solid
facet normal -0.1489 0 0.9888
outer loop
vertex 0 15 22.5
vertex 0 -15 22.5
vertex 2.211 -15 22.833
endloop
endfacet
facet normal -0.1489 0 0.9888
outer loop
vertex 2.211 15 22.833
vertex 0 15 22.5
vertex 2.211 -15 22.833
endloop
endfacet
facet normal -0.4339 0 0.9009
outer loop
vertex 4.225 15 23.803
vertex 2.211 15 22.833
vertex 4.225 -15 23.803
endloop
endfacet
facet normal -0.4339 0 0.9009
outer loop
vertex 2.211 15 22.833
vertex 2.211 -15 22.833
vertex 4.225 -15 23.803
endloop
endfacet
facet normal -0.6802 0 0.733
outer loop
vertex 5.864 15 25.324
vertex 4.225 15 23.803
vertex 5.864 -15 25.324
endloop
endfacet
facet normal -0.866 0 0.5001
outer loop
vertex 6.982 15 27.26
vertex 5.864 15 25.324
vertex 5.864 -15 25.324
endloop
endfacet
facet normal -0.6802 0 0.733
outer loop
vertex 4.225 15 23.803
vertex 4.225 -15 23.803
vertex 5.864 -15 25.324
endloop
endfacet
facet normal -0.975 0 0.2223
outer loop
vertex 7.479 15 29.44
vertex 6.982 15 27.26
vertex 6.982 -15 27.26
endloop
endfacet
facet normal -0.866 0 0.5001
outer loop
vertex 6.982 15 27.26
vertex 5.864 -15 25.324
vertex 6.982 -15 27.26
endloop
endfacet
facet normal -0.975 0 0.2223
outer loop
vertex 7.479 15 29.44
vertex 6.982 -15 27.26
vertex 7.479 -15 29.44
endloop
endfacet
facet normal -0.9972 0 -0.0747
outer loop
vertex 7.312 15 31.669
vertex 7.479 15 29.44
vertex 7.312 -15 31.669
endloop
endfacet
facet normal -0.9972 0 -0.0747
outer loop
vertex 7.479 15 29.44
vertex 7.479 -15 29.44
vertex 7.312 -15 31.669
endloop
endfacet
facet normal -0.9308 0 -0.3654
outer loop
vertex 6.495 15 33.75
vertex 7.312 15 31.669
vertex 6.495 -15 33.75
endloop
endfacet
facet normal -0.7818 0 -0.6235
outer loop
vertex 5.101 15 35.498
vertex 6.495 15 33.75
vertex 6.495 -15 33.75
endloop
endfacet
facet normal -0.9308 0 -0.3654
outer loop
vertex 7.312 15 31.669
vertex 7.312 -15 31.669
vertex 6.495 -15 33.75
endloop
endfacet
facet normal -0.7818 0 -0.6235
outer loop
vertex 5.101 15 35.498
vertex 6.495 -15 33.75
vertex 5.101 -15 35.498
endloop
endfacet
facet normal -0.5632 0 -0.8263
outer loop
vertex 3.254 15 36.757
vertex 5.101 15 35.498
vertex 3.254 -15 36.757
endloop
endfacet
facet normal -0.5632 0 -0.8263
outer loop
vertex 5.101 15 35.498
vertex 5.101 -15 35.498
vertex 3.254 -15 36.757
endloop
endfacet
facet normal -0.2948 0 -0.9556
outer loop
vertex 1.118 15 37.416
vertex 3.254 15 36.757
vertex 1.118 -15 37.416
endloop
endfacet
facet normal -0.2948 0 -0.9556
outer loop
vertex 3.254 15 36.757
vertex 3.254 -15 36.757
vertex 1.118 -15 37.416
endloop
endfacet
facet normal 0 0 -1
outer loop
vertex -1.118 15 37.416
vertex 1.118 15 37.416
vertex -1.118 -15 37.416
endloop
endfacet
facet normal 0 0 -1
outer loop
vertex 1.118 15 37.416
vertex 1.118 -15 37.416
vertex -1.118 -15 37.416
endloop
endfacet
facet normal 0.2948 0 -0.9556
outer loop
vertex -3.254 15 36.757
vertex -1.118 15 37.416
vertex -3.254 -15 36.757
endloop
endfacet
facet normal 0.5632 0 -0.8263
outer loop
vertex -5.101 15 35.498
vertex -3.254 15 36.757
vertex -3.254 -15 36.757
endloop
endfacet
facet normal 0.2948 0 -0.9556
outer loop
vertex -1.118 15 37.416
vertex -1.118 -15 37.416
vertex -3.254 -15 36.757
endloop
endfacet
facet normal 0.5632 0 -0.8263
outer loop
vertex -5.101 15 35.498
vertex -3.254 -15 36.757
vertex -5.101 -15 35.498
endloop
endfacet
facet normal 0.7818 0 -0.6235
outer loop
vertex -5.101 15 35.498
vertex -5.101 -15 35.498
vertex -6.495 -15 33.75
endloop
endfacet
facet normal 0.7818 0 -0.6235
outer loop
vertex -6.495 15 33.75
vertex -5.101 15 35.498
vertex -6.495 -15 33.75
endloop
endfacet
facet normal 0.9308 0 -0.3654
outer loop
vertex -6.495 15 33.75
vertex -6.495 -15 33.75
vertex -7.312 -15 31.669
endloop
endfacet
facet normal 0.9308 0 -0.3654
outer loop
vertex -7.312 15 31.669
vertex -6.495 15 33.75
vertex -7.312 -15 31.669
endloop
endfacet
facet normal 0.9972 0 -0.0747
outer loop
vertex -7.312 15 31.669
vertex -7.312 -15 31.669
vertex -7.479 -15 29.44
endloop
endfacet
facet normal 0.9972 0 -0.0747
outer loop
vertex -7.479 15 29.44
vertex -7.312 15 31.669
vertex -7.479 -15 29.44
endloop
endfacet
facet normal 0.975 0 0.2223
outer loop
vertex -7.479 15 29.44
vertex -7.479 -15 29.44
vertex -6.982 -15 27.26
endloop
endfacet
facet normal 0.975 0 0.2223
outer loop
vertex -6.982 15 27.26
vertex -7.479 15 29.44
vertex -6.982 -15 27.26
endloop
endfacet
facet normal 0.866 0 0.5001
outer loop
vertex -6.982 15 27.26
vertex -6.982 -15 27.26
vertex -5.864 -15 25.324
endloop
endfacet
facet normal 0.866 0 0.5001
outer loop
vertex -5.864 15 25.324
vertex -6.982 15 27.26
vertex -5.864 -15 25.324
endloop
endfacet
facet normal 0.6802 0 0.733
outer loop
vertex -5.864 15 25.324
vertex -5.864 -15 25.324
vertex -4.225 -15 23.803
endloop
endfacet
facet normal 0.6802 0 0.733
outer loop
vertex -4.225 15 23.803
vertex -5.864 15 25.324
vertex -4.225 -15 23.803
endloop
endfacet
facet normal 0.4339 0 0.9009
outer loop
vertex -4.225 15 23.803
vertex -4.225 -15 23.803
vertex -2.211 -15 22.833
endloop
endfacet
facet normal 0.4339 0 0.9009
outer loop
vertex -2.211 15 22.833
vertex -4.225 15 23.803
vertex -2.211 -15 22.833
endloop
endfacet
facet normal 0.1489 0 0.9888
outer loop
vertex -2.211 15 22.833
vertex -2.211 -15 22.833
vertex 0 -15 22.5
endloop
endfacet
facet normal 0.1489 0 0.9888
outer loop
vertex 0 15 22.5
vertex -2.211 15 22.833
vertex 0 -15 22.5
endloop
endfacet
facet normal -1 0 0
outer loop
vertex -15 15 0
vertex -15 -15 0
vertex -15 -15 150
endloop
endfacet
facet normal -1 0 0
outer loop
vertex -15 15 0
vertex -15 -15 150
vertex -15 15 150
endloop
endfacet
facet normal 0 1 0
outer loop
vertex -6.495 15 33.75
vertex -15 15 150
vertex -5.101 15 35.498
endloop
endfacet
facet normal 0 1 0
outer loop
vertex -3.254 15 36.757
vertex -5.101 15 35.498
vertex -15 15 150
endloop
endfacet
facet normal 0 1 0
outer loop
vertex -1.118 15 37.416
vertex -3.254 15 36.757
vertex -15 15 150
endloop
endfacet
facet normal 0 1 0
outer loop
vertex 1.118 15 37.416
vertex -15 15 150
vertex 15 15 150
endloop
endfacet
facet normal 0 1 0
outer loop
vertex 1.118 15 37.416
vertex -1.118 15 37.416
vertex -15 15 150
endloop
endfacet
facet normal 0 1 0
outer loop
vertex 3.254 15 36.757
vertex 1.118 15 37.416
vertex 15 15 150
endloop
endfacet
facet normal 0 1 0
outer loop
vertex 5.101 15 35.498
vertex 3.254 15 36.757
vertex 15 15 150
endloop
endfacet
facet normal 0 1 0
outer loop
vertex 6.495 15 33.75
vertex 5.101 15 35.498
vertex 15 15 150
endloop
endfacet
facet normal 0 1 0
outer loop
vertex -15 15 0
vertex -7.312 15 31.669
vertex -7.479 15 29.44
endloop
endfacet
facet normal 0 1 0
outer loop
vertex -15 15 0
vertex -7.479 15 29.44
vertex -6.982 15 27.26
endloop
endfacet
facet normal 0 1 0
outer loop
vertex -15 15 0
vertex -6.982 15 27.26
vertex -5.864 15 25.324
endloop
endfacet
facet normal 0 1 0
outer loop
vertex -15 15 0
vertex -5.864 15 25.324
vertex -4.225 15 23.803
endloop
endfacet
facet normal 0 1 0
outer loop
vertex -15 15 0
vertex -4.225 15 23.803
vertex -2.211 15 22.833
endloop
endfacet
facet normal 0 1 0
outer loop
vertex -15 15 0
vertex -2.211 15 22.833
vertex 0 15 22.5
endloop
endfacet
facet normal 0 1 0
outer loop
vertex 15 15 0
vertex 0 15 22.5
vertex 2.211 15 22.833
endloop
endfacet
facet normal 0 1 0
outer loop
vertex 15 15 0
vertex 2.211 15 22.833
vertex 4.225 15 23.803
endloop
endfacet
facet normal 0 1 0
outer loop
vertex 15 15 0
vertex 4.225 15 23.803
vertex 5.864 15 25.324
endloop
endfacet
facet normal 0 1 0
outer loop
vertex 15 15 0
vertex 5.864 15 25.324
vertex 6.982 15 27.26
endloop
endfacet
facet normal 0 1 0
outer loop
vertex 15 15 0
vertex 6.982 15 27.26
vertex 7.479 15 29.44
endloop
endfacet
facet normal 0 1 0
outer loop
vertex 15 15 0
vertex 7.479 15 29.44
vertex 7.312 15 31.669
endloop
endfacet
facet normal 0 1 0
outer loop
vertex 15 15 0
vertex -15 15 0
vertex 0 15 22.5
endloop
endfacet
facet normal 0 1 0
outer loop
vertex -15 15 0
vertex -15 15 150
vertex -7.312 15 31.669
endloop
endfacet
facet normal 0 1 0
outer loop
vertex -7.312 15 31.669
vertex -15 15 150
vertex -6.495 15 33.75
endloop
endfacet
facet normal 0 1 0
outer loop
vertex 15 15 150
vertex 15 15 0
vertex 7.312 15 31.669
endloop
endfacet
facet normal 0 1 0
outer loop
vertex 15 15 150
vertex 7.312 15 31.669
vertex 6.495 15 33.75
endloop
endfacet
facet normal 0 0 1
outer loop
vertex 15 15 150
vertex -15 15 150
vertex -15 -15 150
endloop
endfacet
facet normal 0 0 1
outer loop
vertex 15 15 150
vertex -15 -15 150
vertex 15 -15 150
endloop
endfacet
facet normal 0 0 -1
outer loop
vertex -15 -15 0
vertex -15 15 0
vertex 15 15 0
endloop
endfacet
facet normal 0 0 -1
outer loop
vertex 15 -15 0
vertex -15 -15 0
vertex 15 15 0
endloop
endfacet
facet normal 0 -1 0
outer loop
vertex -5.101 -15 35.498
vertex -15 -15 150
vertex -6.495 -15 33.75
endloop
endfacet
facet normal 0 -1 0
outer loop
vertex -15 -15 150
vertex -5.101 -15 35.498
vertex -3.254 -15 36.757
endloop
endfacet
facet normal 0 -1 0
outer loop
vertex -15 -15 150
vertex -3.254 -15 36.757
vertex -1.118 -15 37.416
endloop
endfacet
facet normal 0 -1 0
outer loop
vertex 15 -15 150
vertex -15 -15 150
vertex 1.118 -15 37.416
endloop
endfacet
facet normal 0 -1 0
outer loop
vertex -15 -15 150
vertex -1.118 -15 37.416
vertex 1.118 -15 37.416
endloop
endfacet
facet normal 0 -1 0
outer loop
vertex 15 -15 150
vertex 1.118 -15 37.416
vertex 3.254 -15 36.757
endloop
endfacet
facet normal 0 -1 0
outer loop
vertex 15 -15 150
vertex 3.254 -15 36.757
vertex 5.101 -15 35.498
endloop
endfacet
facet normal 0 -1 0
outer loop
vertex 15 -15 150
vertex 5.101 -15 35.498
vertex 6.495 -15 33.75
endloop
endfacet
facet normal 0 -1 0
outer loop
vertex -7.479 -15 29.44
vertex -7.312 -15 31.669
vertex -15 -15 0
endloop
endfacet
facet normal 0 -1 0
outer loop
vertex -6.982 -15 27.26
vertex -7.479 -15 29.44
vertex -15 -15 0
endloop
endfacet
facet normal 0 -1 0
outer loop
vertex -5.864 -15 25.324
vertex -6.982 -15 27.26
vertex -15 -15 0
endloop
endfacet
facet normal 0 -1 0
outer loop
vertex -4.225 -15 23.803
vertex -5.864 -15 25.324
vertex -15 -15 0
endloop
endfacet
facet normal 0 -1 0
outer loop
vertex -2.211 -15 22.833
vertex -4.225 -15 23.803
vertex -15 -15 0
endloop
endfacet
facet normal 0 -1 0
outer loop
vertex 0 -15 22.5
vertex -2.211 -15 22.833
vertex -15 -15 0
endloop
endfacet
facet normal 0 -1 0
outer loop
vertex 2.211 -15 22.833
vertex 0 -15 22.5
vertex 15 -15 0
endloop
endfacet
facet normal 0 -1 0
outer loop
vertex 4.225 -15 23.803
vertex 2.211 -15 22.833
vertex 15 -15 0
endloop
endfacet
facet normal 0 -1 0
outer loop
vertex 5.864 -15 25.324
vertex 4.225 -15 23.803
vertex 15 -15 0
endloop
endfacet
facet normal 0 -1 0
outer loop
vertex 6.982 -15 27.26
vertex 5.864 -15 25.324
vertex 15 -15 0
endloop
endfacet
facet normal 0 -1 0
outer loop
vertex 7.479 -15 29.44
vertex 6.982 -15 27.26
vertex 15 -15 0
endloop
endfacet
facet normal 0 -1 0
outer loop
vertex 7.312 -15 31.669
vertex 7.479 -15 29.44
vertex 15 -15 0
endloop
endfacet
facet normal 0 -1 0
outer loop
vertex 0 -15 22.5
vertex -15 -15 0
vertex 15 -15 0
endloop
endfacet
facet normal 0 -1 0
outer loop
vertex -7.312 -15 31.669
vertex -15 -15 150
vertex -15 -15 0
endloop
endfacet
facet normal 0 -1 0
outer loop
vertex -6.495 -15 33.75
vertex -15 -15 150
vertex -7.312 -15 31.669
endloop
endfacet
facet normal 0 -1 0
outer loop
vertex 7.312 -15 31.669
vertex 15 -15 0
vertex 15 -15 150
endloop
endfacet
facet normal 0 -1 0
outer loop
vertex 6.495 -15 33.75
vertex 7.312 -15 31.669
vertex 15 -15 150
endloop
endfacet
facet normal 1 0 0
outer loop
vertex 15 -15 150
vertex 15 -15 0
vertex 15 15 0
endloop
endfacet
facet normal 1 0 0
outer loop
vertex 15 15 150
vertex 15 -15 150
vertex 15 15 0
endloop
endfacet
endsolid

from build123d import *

# Parameters (mm, degrees)
SKETCH1_W           = 30
SKETCH1_H           = 30
BOSS_EXTRUDE1_DEPTH = 150
SKETCH2_R           = 7.5
CUT_EXTRUDE1_DEPTH  = 150


with BuildPart() as part:
    # Sketch1 → Boss-Extrude1 (new body)
    with BuildSketch(Plane.XY):
        Rectangle(SKETCH1_W, SKETCH1_H)
    extrude(amount=BOSS_EXTRUDE1_DEPTH)

    # Sketch2 → Cut-Extrude1 (cut)
    with BuildSketch(Plane.XZ.offset(15)):
        with Locations(Location((0, 30, 0), (0, 0, 270))):
            Circle(SKETCH2_R)
    extrude(amount=-CUT_EXTRUDE1_DEPTH, mode=Mode.SUBTRACT)


solid = part.part
